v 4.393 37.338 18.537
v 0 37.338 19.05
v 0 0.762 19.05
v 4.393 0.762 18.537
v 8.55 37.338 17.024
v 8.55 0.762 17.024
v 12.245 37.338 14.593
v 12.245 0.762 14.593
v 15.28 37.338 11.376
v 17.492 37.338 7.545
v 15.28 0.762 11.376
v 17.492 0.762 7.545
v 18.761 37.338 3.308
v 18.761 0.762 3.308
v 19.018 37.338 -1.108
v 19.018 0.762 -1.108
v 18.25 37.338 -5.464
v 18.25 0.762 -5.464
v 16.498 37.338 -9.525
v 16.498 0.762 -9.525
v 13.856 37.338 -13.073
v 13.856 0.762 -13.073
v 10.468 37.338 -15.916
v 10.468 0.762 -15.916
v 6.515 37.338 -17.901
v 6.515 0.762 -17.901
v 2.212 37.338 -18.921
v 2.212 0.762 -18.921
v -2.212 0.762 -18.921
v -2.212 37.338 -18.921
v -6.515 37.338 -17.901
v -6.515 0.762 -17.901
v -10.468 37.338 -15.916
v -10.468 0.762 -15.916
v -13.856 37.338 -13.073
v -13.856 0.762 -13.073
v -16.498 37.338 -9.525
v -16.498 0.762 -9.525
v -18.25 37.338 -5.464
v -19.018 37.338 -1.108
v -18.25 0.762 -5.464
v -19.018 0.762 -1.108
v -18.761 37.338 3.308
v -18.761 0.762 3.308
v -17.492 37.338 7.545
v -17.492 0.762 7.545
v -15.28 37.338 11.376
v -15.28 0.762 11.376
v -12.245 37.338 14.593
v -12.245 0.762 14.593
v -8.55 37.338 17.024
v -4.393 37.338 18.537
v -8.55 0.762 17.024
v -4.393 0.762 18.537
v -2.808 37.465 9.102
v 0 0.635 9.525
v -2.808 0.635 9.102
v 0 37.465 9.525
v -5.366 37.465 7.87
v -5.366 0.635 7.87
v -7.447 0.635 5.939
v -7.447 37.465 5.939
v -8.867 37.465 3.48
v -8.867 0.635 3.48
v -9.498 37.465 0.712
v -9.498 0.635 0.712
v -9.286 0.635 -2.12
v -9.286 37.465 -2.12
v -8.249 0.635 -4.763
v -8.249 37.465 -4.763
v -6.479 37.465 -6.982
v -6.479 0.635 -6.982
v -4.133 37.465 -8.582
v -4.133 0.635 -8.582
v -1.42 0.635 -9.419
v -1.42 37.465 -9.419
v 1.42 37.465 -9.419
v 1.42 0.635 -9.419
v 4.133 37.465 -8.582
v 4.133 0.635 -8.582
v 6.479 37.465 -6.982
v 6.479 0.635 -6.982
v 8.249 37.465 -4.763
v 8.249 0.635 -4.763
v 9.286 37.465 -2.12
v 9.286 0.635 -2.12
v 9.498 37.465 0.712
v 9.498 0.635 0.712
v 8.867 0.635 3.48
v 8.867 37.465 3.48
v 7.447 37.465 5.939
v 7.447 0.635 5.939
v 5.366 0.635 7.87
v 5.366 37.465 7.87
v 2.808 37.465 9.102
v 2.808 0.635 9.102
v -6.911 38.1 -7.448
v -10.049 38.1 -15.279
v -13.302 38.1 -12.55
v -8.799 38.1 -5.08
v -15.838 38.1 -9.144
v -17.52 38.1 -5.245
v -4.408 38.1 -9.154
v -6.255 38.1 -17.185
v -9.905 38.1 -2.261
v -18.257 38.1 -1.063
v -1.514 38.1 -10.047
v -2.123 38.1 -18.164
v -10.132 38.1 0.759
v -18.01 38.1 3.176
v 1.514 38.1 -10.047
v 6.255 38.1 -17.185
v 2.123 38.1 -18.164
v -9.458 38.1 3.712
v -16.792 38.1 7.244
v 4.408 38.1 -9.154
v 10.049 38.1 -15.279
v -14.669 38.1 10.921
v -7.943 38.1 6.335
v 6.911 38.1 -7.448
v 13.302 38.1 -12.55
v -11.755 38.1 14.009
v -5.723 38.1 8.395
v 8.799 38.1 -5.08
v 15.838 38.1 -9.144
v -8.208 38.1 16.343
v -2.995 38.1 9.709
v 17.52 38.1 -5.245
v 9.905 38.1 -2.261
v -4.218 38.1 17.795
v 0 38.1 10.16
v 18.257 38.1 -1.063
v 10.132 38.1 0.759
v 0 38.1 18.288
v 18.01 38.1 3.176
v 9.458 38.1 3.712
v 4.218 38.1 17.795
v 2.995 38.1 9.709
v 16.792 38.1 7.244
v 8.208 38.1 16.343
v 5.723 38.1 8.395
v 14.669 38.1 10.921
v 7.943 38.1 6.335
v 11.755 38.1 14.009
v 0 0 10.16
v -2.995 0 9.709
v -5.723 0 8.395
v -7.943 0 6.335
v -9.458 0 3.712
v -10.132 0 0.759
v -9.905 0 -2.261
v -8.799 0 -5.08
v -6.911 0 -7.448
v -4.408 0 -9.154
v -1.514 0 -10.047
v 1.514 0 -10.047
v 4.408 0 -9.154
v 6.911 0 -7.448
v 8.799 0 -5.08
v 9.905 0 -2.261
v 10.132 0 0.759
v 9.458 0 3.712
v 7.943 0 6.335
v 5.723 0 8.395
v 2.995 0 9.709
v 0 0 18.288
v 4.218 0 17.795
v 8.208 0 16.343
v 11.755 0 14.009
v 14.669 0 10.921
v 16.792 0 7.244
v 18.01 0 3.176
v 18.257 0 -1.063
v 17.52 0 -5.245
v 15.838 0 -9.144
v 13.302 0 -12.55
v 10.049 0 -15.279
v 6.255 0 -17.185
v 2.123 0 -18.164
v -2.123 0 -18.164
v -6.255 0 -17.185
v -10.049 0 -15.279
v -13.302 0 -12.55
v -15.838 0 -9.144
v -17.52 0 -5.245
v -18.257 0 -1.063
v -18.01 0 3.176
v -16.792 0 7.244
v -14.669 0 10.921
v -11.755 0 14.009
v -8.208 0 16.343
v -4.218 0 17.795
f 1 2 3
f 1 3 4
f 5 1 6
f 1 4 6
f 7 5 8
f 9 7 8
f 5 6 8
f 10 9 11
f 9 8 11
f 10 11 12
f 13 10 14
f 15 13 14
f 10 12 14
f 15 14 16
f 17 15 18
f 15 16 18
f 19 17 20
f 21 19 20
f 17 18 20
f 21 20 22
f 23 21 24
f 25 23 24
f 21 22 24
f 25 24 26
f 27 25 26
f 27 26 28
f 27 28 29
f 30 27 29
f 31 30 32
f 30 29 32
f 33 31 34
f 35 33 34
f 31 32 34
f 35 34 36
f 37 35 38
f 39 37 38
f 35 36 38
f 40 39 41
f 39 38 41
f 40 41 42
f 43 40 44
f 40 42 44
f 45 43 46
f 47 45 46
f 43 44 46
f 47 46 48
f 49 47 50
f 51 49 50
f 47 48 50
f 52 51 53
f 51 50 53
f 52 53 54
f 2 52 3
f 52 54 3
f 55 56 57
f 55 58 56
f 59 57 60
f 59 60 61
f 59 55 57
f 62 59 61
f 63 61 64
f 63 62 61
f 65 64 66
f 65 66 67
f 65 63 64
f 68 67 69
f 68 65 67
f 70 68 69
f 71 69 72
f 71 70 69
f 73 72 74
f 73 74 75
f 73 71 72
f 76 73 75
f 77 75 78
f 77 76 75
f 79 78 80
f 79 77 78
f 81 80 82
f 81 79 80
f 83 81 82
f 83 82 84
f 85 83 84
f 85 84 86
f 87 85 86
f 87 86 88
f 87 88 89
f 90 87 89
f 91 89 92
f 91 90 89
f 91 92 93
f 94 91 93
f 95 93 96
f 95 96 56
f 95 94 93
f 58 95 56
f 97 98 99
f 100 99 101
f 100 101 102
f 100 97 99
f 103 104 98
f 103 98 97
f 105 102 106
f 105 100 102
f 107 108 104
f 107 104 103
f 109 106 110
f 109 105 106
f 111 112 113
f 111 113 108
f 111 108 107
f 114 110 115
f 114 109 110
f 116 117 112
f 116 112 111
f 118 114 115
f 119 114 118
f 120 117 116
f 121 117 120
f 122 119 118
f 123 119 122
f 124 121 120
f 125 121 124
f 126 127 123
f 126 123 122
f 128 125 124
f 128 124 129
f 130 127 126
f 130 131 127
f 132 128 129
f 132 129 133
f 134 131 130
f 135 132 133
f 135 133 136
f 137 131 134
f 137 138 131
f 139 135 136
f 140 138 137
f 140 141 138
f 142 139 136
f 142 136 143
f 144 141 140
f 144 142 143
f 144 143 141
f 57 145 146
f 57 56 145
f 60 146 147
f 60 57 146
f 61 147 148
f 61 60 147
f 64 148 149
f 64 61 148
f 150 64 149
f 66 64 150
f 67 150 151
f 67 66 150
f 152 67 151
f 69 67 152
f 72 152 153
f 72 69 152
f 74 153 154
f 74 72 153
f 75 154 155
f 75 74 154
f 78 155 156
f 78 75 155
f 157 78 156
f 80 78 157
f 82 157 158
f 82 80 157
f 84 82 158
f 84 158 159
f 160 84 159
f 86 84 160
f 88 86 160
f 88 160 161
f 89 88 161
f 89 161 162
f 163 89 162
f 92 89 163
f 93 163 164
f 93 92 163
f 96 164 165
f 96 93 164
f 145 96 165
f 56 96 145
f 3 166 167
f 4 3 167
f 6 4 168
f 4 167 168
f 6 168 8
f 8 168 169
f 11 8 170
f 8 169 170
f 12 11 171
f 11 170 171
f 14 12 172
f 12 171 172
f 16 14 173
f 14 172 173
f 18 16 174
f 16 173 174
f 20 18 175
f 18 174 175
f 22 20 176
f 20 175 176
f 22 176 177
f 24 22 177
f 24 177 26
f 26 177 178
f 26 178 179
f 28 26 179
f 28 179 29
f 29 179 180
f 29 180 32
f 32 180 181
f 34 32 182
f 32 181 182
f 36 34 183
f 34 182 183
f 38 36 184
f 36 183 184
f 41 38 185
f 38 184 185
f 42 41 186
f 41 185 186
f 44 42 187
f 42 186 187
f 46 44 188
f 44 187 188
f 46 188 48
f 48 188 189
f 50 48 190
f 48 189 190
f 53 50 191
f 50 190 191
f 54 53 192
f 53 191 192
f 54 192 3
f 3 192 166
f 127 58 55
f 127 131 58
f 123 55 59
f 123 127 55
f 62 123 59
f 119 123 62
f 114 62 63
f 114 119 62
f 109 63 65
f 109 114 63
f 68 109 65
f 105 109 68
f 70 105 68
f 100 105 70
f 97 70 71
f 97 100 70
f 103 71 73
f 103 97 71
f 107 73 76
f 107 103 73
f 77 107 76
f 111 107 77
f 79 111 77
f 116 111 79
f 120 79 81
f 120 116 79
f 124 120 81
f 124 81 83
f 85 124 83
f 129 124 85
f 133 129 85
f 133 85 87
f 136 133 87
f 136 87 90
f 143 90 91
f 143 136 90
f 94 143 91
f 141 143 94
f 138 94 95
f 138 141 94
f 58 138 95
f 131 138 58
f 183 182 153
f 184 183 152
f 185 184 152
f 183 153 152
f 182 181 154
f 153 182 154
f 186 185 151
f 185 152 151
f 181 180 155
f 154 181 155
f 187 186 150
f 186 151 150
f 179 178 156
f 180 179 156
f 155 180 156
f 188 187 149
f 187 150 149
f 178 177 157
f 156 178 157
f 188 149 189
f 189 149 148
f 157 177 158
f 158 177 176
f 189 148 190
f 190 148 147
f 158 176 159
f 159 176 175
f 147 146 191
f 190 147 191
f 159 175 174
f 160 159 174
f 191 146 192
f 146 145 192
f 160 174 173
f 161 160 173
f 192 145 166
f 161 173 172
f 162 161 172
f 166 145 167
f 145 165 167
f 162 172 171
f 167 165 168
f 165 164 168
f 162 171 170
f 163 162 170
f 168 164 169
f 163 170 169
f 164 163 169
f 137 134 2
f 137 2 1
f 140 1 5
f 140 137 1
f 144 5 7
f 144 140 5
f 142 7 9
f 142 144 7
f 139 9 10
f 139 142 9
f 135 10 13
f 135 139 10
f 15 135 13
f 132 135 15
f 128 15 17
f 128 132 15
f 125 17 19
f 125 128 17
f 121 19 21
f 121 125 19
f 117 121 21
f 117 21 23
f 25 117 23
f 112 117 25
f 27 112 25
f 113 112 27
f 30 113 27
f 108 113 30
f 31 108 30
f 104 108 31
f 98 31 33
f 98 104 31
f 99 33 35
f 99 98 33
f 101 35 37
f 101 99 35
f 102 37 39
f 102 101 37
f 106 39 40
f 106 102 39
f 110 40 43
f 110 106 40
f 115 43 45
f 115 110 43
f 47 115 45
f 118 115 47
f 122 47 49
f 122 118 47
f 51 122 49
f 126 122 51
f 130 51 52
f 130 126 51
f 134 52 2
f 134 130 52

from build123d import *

# Parameters (mm, degrees)
SKETCH1_R      = 19.05
EXTRUDE1_DEPTH = 38.1
CHAMFER1_SIZE  = 0.762


with BuildPart() as part:
    # Sketch1 → Extrude1 (new body)
    with BuildSketch(Plane(origin=(0, 0, 0), x_dir=(1, 0, 0), z_dir=(0, 1, 0))):
        with Locations(Location((0, 0, 0), (0, 0, 270))):  # turned: the seam where the file's is
            Circle(SKETCH1_R)
    extrude(amount=EXTRUDE1_DEPTH)

    # Sketch2 → 3/4 (0.75) Diameter Hole1 (revolve, cut)
    with BuildSketch(Plane(origin=(0, 38.1, 0), x_dir=(0, 0, 1), z_dir=(1, 0, 0))):
        Polygon((0, 0), (0, 38.1), (10.16, 38.1), (9.525, 37.465), (9.525, 0.635), (10.16, 0), align=None)
    revolve(axis=Axis((0, 44.45, 0), (0, -1, 0)), mode=Mode.SUBTRACT)

    # Chamfer1
    chamfer1_edges = [part.edges().sort_by_distance(p)[0] for p in [
        (0, 0, -19.05),
        (0, 38.1, -19.05),
    ]]
    chamfer(chamfer1_edges, length=CHAMFER1_SIZE)


solid = part.part
